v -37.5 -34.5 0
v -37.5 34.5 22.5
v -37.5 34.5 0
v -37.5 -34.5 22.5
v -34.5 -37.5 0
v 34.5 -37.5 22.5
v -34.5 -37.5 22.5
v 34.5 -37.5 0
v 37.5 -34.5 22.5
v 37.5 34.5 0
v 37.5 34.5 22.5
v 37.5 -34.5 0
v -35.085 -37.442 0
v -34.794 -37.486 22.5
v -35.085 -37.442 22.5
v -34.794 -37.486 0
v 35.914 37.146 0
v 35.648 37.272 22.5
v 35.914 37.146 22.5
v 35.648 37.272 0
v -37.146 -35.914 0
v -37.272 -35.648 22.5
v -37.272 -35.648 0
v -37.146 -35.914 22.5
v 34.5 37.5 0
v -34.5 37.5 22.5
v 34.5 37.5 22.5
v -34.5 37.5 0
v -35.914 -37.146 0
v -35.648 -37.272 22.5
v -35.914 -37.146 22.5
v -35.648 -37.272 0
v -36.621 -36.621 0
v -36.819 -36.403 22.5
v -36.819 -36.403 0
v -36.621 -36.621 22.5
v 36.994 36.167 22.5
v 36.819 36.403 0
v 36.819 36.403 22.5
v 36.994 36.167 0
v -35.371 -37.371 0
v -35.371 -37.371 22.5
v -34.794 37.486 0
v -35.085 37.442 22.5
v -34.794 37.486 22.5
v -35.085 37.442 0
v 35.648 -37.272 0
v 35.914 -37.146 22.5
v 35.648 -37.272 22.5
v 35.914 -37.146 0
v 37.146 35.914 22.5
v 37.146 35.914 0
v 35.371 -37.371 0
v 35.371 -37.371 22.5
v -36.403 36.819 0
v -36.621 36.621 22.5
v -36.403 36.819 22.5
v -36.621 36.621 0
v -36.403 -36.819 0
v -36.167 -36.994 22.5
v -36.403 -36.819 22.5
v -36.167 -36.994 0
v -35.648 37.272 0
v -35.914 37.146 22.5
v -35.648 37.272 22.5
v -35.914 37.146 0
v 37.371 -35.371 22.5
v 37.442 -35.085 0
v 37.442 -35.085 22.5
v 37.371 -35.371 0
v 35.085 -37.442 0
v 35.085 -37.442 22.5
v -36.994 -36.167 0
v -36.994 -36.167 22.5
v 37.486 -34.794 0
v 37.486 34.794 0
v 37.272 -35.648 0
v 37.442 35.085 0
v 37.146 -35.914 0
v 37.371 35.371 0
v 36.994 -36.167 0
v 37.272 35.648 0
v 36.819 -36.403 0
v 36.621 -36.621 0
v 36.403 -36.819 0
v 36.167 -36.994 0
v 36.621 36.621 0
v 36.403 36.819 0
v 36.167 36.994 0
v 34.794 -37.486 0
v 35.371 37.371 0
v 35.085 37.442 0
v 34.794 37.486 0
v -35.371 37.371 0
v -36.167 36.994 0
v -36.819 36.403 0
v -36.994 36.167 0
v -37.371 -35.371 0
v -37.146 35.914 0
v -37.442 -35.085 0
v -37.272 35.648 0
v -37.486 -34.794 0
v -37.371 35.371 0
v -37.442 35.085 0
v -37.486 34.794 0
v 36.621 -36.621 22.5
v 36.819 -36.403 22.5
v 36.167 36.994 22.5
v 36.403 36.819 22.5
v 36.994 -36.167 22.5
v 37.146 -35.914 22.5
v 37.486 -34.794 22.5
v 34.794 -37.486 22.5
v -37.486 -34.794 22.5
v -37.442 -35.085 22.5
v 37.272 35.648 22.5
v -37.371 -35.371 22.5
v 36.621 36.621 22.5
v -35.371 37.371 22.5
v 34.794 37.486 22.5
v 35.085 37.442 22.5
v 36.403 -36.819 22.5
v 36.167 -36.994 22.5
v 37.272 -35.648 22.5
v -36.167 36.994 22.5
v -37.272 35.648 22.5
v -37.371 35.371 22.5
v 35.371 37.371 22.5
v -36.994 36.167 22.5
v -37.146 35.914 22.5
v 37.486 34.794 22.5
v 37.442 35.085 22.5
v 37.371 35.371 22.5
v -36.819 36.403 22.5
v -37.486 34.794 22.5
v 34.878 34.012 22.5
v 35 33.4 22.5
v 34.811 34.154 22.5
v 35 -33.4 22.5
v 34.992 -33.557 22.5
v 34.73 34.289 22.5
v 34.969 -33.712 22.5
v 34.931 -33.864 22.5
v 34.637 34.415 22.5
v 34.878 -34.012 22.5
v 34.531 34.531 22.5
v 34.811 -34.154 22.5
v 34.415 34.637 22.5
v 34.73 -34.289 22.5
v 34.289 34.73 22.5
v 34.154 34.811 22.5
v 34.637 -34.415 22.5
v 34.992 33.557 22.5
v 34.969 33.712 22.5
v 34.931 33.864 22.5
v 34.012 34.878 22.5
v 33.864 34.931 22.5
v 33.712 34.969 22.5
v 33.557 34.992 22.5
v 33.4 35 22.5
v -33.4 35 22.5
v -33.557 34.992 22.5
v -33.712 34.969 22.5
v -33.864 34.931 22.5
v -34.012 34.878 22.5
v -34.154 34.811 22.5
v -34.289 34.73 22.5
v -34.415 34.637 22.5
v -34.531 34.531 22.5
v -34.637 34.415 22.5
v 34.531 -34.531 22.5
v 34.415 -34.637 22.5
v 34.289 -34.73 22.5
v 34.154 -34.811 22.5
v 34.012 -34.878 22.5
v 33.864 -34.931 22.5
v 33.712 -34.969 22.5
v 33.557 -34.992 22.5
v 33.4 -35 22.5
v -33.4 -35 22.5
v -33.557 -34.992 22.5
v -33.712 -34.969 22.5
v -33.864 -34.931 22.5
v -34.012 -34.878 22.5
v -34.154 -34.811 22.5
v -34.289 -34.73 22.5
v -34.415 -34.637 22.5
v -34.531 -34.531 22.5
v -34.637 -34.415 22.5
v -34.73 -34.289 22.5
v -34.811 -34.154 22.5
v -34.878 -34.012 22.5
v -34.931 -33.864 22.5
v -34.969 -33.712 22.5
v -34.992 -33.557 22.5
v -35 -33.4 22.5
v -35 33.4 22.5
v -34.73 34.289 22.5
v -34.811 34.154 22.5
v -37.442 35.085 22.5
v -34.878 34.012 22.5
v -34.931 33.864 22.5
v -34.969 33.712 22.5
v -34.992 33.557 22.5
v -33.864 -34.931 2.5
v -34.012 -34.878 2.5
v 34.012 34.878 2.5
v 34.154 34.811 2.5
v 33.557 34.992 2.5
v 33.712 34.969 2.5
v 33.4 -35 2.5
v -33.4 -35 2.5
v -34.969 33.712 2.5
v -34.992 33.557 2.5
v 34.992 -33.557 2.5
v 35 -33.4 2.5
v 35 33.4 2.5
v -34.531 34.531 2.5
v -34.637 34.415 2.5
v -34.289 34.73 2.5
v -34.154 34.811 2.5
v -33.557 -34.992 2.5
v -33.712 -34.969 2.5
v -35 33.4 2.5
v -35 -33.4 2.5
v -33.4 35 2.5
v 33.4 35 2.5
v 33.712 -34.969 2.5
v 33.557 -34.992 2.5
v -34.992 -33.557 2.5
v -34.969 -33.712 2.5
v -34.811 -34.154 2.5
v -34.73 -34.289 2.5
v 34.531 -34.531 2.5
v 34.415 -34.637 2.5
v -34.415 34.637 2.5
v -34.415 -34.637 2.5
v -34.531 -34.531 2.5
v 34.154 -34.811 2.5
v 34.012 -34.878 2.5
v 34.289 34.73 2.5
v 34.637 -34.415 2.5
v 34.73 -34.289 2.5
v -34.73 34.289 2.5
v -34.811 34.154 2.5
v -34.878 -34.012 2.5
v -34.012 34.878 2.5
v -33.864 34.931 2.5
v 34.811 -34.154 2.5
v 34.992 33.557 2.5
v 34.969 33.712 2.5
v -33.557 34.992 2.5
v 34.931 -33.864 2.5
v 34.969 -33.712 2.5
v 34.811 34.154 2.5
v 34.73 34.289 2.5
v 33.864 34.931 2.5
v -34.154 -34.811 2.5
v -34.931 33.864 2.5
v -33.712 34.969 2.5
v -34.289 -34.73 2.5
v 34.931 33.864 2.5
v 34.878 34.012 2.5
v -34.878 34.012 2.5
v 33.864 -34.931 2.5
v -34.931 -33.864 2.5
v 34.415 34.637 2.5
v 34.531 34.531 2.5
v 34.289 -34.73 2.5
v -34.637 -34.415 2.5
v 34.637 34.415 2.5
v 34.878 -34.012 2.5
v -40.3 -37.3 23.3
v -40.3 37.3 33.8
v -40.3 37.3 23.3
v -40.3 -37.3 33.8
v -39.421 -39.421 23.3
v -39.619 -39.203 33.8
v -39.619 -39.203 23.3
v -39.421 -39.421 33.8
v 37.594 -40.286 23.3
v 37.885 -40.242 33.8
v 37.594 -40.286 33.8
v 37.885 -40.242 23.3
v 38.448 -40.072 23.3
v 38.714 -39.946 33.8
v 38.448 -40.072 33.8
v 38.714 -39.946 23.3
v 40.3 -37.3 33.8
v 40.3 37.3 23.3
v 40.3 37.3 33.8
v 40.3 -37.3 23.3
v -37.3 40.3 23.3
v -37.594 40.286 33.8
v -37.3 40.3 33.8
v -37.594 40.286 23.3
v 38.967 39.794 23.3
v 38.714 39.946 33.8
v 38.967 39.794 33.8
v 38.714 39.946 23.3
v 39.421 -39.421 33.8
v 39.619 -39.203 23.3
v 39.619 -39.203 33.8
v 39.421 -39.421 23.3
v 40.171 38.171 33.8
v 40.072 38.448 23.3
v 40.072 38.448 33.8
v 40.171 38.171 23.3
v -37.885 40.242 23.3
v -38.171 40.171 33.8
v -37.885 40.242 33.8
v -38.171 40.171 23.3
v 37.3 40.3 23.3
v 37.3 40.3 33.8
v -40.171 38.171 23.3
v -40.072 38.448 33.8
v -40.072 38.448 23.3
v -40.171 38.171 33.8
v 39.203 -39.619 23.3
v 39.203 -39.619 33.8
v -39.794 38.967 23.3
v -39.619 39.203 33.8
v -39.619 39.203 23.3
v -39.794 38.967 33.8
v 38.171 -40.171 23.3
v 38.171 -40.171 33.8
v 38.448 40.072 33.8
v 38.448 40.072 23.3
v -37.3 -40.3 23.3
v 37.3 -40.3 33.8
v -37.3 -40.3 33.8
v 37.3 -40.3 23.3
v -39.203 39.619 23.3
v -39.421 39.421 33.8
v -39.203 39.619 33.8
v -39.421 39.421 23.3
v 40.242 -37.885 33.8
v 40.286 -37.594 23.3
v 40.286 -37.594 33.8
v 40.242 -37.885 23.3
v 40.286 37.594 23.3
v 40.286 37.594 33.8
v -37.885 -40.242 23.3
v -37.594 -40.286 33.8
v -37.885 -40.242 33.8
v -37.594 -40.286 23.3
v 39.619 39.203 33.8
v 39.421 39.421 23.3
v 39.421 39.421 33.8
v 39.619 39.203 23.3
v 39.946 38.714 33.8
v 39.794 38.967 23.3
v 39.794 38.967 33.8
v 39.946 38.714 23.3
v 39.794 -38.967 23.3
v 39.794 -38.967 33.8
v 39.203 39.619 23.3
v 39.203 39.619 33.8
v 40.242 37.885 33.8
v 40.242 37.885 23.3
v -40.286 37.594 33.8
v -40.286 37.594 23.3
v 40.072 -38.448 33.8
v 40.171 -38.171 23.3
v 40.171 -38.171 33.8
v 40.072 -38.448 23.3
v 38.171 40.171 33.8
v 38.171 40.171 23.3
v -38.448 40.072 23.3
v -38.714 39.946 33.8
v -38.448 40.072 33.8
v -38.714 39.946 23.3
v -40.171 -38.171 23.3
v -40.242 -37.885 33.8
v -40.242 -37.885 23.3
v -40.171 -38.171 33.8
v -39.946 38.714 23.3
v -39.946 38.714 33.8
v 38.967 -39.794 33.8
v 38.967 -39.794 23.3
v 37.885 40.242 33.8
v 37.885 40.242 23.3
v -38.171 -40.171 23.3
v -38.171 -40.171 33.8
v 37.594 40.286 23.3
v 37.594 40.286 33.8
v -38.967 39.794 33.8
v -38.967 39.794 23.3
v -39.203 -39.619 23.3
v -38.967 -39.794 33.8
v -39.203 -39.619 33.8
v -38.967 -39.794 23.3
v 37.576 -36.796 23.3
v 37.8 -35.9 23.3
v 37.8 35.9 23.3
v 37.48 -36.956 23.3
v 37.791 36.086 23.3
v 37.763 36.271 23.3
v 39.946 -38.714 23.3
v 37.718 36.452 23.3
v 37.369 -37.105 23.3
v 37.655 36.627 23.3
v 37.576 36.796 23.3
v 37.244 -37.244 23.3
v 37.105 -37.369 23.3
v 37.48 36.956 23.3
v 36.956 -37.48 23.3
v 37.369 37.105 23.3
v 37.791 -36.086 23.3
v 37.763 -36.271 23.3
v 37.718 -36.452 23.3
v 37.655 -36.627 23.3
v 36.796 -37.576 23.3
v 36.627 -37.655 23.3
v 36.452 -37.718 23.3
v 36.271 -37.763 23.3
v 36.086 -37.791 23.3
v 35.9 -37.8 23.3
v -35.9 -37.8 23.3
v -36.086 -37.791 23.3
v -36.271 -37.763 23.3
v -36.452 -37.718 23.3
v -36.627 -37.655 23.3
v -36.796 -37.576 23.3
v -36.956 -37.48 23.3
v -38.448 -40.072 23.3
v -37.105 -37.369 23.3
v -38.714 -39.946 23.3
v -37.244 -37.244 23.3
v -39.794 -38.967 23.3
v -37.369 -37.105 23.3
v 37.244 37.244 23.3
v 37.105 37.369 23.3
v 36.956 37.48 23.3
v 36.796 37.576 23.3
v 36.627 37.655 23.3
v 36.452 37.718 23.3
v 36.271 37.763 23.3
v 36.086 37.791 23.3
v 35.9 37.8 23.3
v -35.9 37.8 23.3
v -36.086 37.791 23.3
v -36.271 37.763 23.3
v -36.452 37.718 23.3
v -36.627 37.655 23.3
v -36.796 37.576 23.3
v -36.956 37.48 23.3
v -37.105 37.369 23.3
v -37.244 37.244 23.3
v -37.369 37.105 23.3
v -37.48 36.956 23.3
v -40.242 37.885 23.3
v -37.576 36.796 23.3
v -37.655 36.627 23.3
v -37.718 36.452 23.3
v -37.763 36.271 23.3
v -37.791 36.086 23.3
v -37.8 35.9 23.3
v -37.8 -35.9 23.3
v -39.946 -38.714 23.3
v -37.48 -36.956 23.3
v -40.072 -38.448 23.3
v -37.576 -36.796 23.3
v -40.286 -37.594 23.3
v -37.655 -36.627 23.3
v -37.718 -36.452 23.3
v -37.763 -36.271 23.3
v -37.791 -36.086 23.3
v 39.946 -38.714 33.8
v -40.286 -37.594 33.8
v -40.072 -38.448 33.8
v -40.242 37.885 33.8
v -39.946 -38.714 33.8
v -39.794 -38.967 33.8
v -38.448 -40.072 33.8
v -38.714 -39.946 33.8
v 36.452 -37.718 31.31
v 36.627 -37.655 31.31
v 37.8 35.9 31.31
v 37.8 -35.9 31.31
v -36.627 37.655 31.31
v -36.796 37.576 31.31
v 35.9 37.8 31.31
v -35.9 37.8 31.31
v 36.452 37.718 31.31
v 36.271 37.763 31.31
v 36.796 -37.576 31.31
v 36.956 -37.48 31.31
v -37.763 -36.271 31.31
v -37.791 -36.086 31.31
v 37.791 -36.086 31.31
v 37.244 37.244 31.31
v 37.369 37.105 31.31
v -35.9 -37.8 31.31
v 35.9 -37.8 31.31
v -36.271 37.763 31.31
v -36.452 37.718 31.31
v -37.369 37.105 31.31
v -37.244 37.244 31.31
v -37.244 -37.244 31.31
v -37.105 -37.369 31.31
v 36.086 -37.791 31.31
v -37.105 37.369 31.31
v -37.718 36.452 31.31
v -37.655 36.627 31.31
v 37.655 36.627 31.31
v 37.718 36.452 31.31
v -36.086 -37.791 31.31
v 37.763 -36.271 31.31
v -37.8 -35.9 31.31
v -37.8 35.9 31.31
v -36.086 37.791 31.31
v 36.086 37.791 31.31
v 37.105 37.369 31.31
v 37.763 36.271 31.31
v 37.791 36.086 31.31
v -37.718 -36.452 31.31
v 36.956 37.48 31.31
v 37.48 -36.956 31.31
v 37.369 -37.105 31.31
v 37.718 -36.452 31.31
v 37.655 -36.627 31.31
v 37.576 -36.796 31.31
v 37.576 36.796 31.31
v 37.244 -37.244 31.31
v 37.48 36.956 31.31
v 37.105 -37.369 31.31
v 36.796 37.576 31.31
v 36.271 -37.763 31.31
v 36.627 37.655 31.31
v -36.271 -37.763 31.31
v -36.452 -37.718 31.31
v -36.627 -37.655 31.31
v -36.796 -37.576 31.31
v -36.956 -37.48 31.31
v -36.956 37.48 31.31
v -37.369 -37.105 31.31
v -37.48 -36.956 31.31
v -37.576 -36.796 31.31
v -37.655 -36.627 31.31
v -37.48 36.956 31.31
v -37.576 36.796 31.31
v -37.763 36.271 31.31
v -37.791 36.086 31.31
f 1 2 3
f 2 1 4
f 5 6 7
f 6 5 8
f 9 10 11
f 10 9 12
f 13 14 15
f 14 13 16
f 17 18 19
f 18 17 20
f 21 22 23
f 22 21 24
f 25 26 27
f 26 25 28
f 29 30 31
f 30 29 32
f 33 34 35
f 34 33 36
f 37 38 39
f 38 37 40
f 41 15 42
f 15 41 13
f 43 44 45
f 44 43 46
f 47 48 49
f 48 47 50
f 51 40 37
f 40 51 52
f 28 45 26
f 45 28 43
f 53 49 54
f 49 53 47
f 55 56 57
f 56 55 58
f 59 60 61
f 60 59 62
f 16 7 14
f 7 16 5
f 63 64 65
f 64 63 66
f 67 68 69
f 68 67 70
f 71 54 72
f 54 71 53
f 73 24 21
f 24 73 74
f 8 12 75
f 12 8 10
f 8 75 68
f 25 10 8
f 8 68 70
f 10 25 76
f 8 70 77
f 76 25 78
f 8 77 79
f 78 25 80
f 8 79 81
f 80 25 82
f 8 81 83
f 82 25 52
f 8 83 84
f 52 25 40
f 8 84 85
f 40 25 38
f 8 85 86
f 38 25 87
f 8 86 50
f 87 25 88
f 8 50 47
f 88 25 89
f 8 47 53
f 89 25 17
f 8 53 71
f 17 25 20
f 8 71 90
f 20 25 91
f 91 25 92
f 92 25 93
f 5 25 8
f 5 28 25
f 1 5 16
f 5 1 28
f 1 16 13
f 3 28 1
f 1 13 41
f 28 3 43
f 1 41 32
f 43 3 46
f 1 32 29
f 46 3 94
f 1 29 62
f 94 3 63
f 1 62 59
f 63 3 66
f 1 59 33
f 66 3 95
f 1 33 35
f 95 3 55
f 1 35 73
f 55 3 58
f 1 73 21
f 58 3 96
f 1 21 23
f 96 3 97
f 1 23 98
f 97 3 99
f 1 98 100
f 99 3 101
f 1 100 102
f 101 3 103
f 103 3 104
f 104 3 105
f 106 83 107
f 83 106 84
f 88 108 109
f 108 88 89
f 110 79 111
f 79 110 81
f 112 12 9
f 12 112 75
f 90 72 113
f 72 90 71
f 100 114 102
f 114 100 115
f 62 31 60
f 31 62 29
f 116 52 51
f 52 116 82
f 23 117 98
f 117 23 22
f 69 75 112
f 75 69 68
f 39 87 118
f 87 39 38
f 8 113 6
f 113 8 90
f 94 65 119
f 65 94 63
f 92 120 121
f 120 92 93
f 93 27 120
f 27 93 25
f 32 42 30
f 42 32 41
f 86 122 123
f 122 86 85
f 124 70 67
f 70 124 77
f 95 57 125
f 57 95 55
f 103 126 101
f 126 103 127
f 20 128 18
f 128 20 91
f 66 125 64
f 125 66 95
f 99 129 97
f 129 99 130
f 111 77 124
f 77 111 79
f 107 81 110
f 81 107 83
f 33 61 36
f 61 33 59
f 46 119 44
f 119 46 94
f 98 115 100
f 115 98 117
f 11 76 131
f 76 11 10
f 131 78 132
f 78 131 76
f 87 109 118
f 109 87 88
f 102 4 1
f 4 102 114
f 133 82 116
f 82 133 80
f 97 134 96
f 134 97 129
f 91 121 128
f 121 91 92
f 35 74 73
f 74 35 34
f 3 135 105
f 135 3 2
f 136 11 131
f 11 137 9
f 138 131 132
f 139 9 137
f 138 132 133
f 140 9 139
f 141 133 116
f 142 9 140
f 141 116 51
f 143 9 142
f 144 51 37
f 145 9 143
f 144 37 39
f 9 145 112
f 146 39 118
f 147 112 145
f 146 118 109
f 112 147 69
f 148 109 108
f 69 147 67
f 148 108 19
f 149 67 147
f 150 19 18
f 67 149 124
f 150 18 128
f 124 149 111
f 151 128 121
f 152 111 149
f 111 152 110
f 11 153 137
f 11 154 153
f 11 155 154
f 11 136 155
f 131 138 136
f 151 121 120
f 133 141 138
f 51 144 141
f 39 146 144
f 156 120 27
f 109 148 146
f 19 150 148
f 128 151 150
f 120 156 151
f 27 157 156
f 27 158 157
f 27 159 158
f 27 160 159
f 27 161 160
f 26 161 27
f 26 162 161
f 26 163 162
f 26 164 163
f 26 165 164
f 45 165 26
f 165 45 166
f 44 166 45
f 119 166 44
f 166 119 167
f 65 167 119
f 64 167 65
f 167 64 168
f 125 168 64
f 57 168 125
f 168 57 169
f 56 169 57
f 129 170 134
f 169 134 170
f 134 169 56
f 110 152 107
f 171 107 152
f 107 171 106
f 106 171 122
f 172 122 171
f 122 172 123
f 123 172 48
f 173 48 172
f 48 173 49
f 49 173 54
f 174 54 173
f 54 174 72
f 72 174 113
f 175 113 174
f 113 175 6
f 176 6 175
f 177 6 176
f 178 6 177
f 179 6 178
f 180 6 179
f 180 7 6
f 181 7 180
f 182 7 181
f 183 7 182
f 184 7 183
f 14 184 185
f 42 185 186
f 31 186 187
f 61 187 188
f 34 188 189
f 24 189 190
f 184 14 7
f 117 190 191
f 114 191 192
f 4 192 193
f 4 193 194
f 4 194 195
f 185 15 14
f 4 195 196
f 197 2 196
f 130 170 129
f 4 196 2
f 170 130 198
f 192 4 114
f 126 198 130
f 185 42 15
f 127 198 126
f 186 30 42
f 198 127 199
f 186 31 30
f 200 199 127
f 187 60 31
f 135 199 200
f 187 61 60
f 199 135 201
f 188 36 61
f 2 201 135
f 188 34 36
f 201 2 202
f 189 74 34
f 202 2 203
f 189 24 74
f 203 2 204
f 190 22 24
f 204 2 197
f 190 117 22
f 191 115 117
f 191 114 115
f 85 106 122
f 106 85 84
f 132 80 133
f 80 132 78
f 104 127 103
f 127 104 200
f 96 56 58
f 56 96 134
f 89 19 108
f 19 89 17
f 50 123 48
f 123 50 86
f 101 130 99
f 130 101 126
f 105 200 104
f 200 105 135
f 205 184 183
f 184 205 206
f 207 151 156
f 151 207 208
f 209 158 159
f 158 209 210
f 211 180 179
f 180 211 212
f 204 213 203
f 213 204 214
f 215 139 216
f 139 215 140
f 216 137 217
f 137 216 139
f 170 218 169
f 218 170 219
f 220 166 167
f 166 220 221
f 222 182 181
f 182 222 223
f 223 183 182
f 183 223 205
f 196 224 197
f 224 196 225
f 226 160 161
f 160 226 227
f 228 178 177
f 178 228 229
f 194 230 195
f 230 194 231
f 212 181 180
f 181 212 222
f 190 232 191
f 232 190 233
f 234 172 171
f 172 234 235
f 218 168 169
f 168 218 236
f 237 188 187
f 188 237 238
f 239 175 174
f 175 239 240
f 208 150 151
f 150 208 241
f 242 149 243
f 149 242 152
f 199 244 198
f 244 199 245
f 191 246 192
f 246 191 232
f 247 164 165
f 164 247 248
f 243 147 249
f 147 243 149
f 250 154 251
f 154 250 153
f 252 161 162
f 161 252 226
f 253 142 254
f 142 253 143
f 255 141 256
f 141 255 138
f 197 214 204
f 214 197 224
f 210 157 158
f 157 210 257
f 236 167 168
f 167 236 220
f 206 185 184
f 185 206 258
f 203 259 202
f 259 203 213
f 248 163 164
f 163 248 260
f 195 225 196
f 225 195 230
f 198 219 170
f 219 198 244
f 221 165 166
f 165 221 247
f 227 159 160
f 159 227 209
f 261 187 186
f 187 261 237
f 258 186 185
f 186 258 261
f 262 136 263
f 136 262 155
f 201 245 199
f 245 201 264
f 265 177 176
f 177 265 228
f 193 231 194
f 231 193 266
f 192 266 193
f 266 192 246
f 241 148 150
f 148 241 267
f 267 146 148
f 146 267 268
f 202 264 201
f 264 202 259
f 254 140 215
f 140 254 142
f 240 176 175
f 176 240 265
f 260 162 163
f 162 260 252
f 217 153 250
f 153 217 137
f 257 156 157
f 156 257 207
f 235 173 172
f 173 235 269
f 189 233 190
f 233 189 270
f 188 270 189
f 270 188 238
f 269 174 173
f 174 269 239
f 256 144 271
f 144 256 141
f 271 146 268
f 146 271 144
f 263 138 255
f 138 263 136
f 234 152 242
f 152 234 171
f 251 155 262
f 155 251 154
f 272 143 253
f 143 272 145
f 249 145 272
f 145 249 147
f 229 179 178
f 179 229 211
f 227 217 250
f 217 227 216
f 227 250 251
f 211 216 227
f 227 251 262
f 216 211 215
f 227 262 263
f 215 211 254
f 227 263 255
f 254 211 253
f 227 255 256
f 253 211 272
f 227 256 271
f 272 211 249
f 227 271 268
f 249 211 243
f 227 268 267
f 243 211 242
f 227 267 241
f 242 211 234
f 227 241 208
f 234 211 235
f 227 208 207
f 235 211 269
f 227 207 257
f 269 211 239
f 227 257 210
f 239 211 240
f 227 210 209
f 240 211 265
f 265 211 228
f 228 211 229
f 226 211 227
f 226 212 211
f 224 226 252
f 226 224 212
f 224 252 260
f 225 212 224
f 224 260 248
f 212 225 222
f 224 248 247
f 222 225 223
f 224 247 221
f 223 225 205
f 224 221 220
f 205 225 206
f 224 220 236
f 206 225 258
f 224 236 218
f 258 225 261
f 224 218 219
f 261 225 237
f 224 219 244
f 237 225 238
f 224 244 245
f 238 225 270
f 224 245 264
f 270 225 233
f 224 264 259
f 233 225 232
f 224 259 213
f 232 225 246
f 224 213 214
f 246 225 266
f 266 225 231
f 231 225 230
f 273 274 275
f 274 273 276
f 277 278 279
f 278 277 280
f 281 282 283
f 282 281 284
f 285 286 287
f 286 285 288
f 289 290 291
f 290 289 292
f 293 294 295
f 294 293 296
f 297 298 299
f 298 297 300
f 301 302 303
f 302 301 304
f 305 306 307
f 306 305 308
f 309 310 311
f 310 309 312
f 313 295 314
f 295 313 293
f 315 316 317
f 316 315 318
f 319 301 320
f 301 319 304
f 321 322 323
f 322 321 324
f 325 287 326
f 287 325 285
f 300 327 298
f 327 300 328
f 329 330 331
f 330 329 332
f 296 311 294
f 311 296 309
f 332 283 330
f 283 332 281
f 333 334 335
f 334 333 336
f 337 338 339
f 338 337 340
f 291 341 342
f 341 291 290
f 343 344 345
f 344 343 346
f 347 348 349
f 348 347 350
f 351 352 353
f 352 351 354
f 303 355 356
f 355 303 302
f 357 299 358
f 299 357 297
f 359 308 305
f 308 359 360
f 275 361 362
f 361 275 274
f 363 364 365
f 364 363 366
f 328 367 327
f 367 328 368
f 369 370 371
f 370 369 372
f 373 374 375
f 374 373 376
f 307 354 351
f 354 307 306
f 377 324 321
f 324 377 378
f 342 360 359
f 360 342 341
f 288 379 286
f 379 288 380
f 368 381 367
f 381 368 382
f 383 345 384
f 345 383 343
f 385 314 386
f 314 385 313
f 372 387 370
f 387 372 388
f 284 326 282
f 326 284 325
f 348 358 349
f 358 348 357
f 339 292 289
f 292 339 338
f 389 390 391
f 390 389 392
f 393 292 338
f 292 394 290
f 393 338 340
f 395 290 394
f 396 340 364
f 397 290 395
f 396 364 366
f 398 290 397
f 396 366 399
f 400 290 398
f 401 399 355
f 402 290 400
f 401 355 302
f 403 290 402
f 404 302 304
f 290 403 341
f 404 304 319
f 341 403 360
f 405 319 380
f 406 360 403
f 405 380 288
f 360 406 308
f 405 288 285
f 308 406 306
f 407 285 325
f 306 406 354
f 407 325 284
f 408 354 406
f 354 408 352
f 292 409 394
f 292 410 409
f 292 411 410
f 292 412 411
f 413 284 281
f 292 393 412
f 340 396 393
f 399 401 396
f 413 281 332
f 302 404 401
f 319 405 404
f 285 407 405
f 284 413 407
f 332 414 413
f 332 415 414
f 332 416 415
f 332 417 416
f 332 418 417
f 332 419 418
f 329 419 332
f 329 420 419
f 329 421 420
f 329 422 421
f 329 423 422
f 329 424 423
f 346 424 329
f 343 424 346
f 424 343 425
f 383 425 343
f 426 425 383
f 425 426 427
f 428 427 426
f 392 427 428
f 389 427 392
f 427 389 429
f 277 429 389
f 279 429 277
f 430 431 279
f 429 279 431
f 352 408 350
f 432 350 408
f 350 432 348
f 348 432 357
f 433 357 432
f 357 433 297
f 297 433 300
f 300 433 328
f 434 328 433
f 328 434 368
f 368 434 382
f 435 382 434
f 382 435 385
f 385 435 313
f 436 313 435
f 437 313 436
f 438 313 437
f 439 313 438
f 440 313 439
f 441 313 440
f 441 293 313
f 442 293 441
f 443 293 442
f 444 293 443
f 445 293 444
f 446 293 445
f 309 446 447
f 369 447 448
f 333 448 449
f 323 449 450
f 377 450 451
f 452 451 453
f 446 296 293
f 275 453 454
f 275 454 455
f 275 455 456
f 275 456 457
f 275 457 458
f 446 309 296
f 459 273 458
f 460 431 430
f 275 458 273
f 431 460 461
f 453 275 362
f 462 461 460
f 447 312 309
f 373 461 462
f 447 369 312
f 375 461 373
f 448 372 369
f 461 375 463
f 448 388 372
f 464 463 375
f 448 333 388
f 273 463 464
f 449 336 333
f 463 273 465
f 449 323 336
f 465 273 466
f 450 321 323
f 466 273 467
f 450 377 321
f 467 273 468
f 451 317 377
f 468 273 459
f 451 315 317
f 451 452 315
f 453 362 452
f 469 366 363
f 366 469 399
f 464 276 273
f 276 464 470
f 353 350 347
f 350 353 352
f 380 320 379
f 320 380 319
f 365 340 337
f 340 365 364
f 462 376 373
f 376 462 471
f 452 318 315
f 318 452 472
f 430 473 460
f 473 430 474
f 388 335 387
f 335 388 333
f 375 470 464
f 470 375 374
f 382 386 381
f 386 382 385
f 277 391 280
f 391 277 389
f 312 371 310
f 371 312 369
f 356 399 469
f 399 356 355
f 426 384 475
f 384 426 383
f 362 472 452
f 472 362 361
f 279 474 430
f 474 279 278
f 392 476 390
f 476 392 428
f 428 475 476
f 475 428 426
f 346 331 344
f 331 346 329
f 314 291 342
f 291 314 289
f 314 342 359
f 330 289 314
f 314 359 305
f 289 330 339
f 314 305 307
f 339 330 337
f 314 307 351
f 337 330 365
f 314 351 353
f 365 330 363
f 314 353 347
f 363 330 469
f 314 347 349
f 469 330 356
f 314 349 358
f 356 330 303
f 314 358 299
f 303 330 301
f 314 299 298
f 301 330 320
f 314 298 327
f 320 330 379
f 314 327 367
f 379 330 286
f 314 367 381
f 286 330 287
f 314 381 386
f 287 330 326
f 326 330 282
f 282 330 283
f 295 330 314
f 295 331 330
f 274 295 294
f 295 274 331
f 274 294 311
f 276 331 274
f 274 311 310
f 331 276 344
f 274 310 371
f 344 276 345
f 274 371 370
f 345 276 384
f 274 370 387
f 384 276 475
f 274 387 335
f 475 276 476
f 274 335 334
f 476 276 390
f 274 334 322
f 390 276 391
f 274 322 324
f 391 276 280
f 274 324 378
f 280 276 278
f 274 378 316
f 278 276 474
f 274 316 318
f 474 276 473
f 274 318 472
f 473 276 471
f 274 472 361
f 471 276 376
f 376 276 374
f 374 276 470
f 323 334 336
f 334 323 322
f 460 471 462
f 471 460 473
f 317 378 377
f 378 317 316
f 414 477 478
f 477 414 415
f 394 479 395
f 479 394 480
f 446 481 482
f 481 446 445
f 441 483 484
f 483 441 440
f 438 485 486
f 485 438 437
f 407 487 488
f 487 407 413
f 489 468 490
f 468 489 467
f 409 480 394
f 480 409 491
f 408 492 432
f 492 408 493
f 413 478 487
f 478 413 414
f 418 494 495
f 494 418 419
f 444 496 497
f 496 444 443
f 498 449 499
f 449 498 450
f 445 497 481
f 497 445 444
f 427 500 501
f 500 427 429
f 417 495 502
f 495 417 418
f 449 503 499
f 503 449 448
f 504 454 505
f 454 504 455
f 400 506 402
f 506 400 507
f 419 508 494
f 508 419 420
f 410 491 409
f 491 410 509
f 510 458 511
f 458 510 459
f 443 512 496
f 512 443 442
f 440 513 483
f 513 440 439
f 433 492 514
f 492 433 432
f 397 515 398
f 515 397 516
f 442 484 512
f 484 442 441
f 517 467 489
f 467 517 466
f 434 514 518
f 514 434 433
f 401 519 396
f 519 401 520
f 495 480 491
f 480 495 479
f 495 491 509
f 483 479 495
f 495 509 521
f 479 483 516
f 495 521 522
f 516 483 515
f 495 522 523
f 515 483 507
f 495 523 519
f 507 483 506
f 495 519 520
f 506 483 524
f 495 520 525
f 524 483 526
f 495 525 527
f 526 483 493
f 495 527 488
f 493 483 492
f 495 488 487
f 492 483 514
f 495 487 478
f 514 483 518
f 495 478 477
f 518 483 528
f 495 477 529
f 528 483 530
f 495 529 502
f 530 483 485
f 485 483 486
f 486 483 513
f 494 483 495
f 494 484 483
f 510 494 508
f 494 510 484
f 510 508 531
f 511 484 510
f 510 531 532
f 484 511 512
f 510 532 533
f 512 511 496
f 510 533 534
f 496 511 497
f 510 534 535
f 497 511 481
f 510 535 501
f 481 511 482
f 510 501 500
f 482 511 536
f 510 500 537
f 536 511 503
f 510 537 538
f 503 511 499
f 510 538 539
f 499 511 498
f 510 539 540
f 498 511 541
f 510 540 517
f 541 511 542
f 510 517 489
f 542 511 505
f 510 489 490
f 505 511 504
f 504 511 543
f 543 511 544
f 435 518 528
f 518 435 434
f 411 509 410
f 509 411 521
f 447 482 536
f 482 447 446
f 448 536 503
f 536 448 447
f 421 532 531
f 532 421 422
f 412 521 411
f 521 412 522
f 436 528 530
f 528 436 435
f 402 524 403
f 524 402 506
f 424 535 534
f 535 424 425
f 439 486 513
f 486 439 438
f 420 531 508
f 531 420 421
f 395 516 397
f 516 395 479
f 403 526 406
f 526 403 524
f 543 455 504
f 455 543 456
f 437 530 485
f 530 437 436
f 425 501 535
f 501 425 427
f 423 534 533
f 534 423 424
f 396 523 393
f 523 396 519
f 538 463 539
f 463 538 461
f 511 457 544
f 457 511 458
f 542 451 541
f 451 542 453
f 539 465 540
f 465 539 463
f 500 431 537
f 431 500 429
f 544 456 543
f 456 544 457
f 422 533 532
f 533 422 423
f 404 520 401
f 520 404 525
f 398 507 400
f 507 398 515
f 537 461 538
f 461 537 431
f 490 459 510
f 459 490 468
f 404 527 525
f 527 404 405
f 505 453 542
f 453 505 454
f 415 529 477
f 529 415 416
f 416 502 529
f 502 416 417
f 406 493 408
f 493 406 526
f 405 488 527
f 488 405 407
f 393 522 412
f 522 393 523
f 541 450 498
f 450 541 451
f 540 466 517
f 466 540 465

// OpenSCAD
$fn = 64;

// Two-part enclosure with nominal print clearance between mating surfaces.
// Base and lid are XY-aligned in assembled position, with a small visual Z gap
// so they render as separate, non-interfering solids.

wall = 2.5;
clearance = 0.30;
display_gap = 0.80;

inner_x = 70;
inner_y = 70;
inner_z = 20;

lid_top = 2.5;
lid_skirt_depth = 8.0;

base_outer_x = inner_x + 2 * wall;
base_outer_y = inner_y + 2 * wall;
base_outer_z = inner_z + wall;

lid_inner_x = base_outer_x + 2 * clearance;
lid_inner_y = base_outer_y + 2 * clearance;
lid_outer_x = lid_inner_x + 2 * wall;
lid_outer_y = lid_inner_y + 2 * wall;
lid_total_z = lid_top + lid_skirt_depth;

module rounded_box(size, r) {
    x = size[0];
    y = size[1];
    z = size[2];
    hull() {
        for (sx = [-1, 1], sy = [-1, 1]) {
            translate([sx * (x / 2 - r), sy * (y / 2 - r), 0])
                cylinder(h = z, r = r);
        }
    }
}

module base_part() {
    difference() {
        rounded_box([base_outer_x, base_outer_y, base_outer_z], 3.0);

        translate([0, 0, wall])
            rounded_box([inner_x, inner_y, inner_z + 0.05], 1.6);
    }
}

module lid_part() {
    difference() {
        rounded_box([lid_outer_x, lid_outer_y, lid_total_z], 3.0);

        translate([0, 0, -0.01])
            rounded_box([lid_inner_x, lid_inner_y, lid_skirt_depth + 0.02], 1.9);
    }
}

// Base sits on the print plane.
base_part();

// Lid is positioned above the base in assembled XY alignment, separated by a
// small visual gap. The skirt clearance is built into lid_inner_x/lid_inner_y.
translate([0, 0, base_outer_z + display_gap])
    lid_part();
